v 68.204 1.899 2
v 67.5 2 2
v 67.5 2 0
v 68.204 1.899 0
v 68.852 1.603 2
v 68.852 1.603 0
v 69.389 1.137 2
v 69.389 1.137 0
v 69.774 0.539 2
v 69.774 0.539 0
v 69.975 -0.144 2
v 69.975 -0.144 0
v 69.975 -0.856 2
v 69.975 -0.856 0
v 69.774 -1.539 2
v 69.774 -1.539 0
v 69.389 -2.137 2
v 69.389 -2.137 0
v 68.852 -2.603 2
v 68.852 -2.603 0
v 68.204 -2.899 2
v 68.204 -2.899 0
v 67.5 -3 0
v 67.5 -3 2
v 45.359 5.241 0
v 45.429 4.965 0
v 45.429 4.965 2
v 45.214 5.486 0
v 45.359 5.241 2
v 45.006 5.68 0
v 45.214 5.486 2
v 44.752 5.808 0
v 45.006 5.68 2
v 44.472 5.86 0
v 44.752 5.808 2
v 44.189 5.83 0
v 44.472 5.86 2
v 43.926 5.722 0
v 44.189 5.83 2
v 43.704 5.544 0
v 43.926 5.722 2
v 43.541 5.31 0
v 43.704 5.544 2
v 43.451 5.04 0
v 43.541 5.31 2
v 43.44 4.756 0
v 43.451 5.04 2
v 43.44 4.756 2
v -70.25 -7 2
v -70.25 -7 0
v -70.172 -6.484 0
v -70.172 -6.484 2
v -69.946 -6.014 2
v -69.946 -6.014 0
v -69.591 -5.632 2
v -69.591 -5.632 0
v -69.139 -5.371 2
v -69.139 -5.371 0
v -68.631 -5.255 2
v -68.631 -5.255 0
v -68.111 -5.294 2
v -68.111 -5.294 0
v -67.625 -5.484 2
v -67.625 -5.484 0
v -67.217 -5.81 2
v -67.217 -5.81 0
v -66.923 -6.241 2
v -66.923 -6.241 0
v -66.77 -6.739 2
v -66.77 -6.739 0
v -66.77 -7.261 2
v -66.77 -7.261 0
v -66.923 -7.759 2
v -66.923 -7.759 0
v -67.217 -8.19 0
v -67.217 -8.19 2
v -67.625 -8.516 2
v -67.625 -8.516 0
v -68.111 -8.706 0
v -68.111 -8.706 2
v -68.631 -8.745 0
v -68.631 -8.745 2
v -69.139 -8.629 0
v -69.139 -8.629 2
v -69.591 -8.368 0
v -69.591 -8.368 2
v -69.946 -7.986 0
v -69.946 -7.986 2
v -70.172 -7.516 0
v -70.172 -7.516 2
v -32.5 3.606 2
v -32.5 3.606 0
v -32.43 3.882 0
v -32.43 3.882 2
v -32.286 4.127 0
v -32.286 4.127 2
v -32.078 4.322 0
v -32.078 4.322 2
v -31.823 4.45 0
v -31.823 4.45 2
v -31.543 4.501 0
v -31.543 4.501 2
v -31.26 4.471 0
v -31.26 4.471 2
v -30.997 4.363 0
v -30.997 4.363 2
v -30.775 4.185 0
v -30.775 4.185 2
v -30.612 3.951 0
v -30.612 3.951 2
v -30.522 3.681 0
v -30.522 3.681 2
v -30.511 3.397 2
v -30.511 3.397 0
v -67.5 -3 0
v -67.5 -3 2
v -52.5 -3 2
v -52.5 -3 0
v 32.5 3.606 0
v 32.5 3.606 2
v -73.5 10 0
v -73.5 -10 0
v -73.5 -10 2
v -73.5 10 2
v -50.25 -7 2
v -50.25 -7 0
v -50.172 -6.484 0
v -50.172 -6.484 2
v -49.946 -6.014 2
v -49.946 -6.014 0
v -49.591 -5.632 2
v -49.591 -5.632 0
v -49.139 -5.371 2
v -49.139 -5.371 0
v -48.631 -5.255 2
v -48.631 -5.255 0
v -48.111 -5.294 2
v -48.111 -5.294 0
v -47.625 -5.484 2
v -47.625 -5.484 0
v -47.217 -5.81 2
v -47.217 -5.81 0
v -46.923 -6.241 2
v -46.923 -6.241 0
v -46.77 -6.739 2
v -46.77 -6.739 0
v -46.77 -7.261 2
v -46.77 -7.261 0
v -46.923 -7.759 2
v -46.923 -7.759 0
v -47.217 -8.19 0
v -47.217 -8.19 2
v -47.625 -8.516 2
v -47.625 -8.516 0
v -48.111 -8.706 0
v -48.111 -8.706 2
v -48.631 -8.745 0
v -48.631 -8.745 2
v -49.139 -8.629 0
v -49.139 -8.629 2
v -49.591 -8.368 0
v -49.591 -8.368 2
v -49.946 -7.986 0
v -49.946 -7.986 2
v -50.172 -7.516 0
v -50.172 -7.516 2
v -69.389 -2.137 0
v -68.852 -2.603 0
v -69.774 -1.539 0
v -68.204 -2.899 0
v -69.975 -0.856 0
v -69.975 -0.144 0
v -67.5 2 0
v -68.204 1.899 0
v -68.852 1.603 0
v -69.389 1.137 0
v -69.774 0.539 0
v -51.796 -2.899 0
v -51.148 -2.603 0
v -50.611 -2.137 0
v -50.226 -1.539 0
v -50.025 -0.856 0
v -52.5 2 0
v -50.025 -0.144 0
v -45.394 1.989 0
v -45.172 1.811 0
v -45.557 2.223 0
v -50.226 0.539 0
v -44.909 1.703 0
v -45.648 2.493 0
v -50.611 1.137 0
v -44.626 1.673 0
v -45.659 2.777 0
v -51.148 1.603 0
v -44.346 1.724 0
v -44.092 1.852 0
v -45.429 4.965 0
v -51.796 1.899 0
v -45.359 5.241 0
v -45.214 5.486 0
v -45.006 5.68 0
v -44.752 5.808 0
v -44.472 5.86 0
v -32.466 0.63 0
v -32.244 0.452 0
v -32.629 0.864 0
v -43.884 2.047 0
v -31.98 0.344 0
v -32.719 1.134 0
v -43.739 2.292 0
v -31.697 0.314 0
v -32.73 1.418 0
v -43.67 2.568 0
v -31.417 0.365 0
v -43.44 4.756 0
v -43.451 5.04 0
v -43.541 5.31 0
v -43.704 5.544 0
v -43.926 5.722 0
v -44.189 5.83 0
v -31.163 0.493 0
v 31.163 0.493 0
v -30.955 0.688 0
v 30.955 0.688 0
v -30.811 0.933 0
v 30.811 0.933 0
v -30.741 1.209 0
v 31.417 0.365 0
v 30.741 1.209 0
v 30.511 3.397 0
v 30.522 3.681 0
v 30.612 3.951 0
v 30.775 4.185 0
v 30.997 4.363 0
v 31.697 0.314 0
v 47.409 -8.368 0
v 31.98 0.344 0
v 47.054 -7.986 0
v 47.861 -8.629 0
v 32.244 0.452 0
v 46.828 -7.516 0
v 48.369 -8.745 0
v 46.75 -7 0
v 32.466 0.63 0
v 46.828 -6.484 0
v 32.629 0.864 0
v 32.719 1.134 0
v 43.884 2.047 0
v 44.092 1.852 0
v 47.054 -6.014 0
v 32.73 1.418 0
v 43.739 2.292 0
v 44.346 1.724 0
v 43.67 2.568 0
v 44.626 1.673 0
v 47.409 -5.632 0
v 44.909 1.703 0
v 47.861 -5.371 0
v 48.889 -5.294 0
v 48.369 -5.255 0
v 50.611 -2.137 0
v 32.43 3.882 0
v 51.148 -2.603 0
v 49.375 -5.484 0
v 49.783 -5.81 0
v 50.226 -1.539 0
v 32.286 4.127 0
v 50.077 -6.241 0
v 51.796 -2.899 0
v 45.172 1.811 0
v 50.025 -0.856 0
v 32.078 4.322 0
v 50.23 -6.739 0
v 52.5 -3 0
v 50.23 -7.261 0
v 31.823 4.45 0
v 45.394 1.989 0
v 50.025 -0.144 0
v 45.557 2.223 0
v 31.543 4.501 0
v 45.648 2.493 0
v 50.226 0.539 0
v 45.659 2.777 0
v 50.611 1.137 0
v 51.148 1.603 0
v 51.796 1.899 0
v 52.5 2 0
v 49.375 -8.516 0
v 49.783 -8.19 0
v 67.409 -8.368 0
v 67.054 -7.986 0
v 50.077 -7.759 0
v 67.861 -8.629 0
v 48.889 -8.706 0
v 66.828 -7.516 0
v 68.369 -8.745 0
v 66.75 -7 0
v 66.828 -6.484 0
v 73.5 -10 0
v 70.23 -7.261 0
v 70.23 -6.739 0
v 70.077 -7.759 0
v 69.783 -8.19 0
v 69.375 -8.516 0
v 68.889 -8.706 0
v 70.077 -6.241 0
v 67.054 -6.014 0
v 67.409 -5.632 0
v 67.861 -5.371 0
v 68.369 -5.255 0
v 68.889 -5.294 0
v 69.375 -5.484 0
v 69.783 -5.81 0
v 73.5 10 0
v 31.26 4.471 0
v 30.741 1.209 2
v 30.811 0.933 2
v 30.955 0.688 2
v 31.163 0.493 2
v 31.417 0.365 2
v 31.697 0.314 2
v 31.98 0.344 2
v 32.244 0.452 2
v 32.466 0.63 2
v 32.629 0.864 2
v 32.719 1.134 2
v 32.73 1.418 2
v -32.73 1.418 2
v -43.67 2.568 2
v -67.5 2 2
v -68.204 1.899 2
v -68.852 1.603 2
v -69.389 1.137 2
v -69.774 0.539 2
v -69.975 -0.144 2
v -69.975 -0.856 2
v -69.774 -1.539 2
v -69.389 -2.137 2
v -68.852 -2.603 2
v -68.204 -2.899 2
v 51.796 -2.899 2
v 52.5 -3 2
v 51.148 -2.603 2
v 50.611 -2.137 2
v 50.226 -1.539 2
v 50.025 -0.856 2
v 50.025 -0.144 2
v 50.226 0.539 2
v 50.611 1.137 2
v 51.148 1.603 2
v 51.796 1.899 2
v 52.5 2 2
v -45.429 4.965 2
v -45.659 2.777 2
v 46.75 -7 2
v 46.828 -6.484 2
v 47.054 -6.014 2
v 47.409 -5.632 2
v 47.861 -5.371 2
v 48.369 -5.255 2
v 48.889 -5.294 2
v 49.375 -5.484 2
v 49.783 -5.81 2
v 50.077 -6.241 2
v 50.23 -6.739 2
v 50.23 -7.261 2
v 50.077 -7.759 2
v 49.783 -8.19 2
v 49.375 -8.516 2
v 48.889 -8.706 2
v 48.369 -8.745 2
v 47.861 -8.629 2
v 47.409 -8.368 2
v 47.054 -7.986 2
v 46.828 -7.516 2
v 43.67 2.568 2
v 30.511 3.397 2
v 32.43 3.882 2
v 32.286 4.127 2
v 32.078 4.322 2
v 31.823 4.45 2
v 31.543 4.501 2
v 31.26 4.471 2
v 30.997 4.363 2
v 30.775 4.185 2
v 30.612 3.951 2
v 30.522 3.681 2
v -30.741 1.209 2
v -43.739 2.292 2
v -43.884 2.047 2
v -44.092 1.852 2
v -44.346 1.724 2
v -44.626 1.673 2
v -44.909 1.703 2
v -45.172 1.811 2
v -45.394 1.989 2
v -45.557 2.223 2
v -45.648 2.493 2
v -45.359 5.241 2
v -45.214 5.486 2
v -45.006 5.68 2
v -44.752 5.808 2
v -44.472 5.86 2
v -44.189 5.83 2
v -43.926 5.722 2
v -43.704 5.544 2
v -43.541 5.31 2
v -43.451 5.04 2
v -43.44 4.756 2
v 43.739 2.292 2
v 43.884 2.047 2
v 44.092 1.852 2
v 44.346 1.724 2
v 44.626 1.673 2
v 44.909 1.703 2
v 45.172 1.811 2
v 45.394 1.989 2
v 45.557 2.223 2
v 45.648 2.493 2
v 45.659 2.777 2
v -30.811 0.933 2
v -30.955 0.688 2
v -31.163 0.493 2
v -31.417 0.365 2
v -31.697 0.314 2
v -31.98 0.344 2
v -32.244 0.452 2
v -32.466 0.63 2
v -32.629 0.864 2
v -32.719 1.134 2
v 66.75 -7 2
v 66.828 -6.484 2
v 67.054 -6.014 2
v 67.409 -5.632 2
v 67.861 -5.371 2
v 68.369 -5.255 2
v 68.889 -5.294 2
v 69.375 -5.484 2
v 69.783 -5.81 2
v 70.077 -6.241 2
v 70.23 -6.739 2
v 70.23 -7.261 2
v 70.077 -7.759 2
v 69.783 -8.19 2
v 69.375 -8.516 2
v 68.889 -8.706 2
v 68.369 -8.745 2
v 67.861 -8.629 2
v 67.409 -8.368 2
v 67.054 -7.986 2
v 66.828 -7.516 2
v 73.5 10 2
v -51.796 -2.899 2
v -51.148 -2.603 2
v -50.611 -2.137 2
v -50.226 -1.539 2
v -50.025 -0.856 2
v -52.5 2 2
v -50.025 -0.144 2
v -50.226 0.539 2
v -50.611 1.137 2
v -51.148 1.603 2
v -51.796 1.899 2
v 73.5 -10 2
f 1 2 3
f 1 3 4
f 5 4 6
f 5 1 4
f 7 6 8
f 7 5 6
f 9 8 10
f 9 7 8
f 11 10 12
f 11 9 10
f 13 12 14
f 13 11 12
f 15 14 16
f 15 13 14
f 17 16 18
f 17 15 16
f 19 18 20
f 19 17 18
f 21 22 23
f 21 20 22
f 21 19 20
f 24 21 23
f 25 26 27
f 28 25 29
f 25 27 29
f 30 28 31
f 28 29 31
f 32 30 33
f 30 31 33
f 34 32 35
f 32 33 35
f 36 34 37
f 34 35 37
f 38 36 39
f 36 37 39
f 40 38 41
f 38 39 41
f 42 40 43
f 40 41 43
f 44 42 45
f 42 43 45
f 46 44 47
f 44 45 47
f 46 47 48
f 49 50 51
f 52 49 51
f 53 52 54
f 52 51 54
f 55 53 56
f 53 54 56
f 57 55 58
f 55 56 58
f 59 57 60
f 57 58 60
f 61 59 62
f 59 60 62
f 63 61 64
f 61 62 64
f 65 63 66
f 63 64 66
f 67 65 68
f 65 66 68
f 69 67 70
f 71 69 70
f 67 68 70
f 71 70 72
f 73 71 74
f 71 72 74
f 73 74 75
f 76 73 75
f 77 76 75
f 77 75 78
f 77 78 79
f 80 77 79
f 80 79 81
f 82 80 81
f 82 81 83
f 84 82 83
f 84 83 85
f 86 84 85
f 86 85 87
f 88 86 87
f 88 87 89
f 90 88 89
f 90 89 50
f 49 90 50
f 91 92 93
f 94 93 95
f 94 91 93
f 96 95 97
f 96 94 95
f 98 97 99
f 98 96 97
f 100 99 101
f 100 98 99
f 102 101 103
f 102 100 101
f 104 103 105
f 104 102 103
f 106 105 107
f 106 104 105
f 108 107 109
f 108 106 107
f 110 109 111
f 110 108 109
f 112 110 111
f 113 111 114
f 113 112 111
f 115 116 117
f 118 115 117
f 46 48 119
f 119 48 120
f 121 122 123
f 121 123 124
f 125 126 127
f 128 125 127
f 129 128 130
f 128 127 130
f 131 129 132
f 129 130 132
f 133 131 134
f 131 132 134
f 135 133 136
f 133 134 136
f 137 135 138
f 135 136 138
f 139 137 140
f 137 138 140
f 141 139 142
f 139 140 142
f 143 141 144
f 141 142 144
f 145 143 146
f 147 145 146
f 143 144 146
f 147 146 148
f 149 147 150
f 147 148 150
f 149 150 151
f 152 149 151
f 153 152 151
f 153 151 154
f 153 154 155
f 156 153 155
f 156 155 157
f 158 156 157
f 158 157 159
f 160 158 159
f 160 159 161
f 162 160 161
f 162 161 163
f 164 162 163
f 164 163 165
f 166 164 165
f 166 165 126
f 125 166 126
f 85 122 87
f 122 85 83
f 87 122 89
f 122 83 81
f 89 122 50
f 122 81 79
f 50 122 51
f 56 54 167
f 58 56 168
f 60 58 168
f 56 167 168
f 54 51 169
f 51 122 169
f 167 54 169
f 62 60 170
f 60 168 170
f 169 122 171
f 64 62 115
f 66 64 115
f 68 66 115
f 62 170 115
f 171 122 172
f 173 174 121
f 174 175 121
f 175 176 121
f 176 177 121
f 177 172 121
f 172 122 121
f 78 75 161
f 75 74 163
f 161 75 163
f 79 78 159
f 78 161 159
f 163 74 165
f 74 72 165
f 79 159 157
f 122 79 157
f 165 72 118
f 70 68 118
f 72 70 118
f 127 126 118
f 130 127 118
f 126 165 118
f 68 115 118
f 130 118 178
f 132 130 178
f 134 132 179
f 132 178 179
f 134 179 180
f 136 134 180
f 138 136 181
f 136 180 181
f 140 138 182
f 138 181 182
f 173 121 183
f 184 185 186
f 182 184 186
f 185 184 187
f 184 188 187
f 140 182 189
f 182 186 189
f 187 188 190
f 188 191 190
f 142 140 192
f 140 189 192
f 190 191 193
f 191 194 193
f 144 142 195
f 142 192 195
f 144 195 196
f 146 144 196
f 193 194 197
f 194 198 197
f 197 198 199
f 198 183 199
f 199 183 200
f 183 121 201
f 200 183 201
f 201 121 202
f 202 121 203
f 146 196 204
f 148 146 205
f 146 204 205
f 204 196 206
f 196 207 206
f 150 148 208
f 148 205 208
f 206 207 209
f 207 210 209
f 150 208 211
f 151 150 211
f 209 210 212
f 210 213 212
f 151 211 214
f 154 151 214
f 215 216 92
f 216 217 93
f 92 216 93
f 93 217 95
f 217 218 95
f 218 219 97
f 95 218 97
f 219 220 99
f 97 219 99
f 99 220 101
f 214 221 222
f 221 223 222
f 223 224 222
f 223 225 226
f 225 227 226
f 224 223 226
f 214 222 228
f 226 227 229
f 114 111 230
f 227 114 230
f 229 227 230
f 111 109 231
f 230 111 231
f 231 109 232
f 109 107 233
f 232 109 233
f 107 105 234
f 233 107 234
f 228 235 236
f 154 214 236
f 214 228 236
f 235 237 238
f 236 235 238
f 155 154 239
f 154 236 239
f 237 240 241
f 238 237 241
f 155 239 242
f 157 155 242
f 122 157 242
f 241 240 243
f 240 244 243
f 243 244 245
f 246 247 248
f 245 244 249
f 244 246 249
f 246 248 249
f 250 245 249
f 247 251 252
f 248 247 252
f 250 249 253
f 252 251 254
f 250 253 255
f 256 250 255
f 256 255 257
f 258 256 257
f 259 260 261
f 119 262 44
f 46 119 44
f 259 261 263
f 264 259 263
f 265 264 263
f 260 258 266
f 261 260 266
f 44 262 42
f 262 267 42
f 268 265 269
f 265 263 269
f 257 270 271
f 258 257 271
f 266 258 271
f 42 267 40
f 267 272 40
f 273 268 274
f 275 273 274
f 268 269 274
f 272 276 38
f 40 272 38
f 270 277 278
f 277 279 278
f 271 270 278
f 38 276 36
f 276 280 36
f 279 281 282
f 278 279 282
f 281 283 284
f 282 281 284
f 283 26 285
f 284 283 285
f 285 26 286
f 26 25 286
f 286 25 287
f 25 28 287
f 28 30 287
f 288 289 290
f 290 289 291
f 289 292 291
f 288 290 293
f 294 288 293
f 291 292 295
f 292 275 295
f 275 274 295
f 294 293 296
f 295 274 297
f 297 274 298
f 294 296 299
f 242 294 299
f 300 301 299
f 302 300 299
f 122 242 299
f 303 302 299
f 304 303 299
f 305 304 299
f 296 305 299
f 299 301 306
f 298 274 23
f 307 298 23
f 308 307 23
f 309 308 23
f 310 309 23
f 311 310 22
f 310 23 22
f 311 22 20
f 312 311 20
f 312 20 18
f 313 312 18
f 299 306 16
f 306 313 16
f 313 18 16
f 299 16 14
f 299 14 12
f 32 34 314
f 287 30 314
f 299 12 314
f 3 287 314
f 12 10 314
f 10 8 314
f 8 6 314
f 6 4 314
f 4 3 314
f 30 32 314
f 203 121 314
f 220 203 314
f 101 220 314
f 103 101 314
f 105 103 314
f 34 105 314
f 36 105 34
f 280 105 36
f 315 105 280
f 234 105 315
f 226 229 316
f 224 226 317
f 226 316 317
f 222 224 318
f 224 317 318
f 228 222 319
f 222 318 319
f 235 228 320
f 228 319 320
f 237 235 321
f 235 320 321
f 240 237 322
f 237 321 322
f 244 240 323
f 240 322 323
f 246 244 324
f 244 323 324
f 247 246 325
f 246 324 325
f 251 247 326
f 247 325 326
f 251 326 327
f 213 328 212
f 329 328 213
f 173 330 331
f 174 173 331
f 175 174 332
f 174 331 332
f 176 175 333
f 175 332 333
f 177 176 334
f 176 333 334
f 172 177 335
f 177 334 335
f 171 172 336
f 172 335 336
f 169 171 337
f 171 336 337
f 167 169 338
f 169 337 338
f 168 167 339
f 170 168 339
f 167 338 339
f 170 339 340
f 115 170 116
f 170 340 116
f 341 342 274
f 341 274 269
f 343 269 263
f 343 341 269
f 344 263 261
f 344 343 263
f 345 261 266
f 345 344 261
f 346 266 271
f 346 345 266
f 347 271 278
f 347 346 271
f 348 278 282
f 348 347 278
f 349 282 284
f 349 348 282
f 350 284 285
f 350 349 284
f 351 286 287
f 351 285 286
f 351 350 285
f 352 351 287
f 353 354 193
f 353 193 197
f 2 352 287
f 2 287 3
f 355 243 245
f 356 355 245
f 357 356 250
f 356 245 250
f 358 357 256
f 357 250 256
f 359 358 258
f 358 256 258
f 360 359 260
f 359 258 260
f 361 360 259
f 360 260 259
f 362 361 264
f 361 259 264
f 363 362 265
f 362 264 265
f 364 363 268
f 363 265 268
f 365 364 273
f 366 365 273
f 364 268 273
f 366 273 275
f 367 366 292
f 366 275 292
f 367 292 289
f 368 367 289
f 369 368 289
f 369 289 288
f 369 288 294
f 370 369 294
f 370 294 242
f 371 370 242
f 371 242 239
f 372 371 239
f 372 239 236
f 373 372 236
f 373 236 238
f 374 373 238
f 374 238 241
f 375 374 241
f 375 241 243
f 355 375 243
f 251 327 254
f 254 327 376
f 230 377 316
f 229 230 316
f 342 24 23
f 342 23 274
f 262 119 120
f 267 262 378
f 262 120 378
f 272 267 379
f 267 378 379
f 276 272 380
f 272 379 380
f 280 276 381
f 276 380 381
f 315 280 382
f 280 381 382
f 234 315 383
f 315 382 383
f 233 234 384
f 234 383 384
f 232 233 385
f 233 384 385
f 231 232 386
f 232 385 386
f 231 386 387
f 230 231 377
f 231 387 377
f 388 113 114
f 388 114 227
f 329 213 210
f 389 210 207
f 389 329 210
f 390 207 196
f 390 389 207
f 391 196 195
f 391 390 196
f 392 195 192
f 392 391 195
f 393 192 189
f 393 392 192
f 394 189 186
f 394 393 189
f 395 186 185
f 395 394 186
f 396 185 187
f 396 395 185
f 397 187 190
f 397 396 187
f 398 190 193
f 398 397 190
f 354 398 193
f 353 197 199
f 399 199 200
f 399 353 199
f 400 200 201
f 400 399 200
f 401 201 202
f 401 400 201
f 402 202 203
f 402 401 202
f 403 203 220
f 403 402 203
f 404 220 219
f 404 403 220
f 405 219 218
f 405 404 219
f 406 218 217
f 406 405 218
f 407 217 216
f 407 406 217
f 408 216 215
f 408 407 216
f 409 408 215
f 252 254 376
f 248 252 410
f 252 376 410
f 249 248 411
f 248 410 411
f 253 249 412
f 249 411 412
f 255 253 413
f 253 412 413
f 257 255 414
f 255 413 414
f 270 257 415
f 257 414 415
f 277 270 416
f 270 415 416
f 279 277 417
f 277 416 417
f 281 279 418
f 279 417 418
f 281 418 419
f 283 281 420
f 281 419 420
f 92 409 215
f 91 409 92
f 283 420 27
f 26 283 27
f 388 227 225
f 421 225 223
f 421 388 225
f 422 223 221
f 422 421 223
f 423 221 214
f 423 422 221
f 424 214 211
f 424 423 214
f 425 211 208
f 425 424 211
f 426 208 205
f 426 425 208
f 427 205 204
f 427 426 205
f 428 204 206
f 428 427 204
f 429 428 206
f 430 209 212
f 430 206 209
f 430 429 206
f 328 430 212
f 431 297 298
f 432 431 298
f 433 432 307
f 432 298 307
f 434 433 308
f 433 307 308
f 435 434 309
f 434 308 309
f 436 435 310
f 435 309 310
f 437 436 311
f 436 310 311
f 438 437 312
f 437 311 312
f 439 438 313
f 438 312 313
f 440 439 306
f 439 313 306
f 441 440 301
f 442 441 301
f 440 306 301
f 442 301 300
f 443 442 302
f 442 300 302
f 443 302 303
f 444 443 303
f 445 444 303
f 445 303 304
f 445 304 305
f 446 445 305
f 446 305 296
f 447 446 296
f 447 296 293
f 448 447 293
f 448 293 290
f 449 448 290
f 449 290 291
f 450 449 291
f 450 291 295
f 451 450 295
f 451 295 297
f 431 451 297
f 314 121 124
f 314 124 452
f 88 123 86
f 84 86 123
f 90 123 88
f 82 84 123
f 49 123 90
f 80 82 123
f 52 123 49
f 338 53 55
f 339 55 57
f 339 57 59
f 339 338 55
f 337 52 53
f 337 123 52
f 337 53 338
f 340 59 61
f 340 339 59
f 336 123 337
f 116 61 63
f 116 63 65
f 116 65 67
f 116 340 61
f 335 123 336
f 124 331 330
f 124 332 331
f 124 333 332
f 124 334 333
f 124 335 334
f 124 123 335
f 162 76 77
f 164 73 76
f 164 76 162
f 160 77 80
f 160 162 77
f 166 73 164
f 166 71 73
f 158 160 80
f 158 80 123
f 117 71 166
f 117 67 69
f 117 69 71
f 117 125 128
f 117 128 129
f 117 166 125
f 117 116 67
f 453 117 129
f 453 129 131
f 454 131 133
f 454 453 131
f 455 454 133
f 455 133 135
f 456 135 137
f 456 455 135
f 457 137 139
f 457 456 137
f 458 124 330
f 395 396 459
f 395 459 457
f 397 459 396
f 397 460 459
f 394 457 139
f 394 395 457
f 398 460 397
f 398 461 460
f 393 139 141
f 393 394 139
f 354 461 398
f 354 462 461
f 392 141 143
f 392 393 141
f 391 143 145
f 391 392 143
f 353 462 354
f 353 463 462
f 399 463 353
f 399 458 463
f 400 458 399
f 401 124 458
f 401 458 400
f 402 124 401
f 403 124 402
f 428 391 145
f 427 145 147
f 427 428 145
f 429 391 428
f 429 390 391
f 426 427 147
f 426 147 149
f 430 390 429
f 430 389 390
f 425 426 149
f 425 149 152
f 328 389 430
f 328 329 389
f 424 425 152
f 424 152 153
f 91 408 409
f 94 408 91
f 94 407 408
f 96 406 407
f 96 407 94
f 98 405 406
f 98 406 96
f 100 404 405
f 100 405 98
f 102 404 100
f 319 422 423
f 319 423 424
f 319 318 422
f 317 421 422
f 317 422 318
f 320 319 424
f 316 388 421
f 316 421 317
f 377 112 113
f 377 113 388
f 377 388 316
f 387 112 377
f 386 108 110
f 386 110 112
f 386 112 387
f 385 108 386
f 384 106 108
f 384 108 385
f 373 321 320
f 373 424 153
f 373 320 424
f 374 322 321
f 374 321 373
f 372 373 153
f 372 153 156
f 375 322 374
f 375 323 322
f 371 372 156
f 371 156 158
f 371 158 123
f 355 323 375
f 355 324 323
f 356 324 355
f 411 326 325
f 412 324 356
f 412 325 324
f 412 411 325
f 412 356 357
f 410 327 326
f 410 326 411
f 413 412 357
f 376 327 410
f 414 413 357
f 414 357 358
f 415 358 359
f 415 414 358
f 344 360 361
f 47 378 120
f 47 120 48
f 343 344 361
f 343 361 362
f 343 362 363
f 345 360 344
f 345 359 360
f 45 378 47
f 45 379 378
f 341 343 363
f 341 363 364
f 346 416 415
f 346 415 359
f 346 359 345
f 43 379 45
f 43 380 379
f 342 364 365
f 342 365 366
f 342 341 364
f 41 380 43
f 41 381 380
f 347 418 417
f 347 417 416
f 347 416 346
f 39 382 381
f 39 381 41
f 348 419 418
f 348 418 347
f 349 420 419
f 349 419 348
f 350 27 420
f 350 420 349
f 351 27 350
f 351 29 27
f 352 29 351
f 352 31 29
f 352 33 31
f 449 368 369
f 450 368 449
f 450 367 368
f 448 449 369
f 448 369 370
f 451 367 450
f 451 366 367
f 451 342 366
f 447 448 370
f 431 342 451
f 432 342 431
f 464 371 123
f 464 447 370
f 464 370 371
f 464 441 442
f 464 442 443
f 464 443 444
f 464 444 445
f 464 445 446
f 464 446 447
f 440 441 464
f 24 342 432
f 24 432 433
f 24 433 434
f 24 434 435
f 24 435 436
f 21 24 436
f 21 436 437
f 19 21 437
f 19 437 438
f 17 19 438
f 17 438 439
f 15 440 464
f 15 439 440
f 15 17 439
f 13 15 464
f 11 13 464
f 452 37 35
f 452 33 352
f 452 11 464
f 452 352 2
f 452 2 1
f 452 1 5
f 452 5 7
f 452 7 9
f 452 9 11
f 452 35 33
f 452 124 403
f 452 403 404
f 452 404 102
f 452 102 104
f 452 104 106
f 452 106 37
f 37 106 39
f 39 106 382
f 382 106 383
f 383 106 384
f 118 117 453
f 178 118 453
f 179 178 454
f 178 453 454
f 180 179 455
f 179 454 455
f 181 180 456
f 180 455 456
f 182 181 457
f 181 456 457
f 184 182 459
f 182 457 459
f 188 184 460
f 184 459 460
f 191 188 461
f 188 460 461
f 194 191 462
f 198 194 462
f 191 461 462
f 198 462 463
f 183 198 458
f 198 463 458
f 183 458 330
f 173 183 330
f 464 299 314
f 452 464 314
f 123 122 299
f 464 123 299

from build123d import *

# Parameters (mm, degrees)
SKETCH_1_W          = 147
SKETCH_1_H          = 20
EXTRUDE_1_DEPTH     = 2
CUT_EXTRUDE_1_DEPTH = 3
SKETCH_3_R          = 1
CUT_EXTRUDE_2_DEPTH = 3
SKETCH_4_R          = 1.75
CUT_EXTRUDE_3_DEPTH = 3
CUT_EXTRUDE_4_DEPTH = 3


with BuildPart() as part:
    # 草图1 → 凸台-拉伸1 (new body)
    with BuildSketch(Plane.XY):
        Rectangle(SKETCH_1_W, SKETCH_1_H)
    extrude(amount=EXTRUDE_1_DEPTH)

    # 草图2 → 切除-拉伸1 (cut)
    with BuildSketch(Plane.XY.offset(2)):
        Polygon((30.510902349, 3.396971992), (30.740864968, 1.209023822), (45.658693398, 2.776950771), (45.428730779, 4.964898941), align=None)
    cut_extrude_1 = extrude(amount=-CUT_EXTRUDE_1_DEPTH, mode=Mode.SUBTRACT)

    # 草图3 → 切除-拉伸2 (cut, through all)
    with BuildSketch(Plane.XY.offset(2)):
        with Locations((31.505424244, 3.501500455)):
            Circle(SKETCH_3_R)
        with Locations((31.735386863, 1.313552286)):
            Circle(SKETCH_3_R)
        with Locations((44.434208884, 4.860370478)):
            Circle(SKETCH_3_R)
        with Locations((44.664171503, 2.672422308)):
            Circle(SKETCH_3_R)
    cut_extrude_2 = extrude(amount=-CUT_EXTRUDE_2_DEPTH, mode=Mode.SUBTRACT)

    # 镜向1: 切除-拉伸1, 切除-拉伸2 across plane
    add(cut_extrude_1.mirror(Plane(origin=(0, 0, 0), x_dir=(0, 0, 1), z_dir=(1, 0, 0))), mode=Mode.SUBTRACT)
    add(cut_extrude_2.mirror(Plane(origin=(0, 0, 0), x_dir=(0, 0, 1), z_dir=(1, 0, 0))), mode=Mode.SUBTRACT)

    # 草图4 → 切除-拉伸3 (cut, through all)
    with BuildSketch(Plane(origin=(0, 0, 0), x_dir=(-1, 0, 0), z_dir=(0, 0, -1))):
        with Locations((68.5, -7)):
            Circle(SKETCH_4_R)
        with Locations((48.5, -7)):
            Circle(SKETCH_4_R)
        with Locations((-48.5, -7)):
            Circle(SKETCH_4_R)
        with Locations((-68.5, -7)):
            Circle(SKETCH_4_R)
    extrude(amount=-CUT_EXTRUDE_3_DEPTH, mode=Mode.SUBTRACT)

    # 草图5 → 切除-拉伸4 (cut, through all)
    with BuildSketch(Plane.XY.offset(2)):
        with BuildLine():
            Line((52.5, 2), (67.5, 2))
            ThreePointArc((67.5, 2), (70, -0.5), (67.5, -3))
            Line((67.5, -3), (52.5, -3))
            ThreePointArc((52.5, -3), (50, -0.5), (52.5, 2))
        make_face()
    cut_extrude_4 = extrude(amount=-CUT_EXTRUDE_4_DEPTH, mode=Mode.SUBTRACT)

    # 镜向2: 切除-拉伸4 across plane
    add(cut_extrude_4.mirror(Plane(origin=(0, 0, 0), x_dir=(0, 0, 1), z_dir=(1, 0, 0))), mode=Mode.SUBTRACT)


solid = part.part
